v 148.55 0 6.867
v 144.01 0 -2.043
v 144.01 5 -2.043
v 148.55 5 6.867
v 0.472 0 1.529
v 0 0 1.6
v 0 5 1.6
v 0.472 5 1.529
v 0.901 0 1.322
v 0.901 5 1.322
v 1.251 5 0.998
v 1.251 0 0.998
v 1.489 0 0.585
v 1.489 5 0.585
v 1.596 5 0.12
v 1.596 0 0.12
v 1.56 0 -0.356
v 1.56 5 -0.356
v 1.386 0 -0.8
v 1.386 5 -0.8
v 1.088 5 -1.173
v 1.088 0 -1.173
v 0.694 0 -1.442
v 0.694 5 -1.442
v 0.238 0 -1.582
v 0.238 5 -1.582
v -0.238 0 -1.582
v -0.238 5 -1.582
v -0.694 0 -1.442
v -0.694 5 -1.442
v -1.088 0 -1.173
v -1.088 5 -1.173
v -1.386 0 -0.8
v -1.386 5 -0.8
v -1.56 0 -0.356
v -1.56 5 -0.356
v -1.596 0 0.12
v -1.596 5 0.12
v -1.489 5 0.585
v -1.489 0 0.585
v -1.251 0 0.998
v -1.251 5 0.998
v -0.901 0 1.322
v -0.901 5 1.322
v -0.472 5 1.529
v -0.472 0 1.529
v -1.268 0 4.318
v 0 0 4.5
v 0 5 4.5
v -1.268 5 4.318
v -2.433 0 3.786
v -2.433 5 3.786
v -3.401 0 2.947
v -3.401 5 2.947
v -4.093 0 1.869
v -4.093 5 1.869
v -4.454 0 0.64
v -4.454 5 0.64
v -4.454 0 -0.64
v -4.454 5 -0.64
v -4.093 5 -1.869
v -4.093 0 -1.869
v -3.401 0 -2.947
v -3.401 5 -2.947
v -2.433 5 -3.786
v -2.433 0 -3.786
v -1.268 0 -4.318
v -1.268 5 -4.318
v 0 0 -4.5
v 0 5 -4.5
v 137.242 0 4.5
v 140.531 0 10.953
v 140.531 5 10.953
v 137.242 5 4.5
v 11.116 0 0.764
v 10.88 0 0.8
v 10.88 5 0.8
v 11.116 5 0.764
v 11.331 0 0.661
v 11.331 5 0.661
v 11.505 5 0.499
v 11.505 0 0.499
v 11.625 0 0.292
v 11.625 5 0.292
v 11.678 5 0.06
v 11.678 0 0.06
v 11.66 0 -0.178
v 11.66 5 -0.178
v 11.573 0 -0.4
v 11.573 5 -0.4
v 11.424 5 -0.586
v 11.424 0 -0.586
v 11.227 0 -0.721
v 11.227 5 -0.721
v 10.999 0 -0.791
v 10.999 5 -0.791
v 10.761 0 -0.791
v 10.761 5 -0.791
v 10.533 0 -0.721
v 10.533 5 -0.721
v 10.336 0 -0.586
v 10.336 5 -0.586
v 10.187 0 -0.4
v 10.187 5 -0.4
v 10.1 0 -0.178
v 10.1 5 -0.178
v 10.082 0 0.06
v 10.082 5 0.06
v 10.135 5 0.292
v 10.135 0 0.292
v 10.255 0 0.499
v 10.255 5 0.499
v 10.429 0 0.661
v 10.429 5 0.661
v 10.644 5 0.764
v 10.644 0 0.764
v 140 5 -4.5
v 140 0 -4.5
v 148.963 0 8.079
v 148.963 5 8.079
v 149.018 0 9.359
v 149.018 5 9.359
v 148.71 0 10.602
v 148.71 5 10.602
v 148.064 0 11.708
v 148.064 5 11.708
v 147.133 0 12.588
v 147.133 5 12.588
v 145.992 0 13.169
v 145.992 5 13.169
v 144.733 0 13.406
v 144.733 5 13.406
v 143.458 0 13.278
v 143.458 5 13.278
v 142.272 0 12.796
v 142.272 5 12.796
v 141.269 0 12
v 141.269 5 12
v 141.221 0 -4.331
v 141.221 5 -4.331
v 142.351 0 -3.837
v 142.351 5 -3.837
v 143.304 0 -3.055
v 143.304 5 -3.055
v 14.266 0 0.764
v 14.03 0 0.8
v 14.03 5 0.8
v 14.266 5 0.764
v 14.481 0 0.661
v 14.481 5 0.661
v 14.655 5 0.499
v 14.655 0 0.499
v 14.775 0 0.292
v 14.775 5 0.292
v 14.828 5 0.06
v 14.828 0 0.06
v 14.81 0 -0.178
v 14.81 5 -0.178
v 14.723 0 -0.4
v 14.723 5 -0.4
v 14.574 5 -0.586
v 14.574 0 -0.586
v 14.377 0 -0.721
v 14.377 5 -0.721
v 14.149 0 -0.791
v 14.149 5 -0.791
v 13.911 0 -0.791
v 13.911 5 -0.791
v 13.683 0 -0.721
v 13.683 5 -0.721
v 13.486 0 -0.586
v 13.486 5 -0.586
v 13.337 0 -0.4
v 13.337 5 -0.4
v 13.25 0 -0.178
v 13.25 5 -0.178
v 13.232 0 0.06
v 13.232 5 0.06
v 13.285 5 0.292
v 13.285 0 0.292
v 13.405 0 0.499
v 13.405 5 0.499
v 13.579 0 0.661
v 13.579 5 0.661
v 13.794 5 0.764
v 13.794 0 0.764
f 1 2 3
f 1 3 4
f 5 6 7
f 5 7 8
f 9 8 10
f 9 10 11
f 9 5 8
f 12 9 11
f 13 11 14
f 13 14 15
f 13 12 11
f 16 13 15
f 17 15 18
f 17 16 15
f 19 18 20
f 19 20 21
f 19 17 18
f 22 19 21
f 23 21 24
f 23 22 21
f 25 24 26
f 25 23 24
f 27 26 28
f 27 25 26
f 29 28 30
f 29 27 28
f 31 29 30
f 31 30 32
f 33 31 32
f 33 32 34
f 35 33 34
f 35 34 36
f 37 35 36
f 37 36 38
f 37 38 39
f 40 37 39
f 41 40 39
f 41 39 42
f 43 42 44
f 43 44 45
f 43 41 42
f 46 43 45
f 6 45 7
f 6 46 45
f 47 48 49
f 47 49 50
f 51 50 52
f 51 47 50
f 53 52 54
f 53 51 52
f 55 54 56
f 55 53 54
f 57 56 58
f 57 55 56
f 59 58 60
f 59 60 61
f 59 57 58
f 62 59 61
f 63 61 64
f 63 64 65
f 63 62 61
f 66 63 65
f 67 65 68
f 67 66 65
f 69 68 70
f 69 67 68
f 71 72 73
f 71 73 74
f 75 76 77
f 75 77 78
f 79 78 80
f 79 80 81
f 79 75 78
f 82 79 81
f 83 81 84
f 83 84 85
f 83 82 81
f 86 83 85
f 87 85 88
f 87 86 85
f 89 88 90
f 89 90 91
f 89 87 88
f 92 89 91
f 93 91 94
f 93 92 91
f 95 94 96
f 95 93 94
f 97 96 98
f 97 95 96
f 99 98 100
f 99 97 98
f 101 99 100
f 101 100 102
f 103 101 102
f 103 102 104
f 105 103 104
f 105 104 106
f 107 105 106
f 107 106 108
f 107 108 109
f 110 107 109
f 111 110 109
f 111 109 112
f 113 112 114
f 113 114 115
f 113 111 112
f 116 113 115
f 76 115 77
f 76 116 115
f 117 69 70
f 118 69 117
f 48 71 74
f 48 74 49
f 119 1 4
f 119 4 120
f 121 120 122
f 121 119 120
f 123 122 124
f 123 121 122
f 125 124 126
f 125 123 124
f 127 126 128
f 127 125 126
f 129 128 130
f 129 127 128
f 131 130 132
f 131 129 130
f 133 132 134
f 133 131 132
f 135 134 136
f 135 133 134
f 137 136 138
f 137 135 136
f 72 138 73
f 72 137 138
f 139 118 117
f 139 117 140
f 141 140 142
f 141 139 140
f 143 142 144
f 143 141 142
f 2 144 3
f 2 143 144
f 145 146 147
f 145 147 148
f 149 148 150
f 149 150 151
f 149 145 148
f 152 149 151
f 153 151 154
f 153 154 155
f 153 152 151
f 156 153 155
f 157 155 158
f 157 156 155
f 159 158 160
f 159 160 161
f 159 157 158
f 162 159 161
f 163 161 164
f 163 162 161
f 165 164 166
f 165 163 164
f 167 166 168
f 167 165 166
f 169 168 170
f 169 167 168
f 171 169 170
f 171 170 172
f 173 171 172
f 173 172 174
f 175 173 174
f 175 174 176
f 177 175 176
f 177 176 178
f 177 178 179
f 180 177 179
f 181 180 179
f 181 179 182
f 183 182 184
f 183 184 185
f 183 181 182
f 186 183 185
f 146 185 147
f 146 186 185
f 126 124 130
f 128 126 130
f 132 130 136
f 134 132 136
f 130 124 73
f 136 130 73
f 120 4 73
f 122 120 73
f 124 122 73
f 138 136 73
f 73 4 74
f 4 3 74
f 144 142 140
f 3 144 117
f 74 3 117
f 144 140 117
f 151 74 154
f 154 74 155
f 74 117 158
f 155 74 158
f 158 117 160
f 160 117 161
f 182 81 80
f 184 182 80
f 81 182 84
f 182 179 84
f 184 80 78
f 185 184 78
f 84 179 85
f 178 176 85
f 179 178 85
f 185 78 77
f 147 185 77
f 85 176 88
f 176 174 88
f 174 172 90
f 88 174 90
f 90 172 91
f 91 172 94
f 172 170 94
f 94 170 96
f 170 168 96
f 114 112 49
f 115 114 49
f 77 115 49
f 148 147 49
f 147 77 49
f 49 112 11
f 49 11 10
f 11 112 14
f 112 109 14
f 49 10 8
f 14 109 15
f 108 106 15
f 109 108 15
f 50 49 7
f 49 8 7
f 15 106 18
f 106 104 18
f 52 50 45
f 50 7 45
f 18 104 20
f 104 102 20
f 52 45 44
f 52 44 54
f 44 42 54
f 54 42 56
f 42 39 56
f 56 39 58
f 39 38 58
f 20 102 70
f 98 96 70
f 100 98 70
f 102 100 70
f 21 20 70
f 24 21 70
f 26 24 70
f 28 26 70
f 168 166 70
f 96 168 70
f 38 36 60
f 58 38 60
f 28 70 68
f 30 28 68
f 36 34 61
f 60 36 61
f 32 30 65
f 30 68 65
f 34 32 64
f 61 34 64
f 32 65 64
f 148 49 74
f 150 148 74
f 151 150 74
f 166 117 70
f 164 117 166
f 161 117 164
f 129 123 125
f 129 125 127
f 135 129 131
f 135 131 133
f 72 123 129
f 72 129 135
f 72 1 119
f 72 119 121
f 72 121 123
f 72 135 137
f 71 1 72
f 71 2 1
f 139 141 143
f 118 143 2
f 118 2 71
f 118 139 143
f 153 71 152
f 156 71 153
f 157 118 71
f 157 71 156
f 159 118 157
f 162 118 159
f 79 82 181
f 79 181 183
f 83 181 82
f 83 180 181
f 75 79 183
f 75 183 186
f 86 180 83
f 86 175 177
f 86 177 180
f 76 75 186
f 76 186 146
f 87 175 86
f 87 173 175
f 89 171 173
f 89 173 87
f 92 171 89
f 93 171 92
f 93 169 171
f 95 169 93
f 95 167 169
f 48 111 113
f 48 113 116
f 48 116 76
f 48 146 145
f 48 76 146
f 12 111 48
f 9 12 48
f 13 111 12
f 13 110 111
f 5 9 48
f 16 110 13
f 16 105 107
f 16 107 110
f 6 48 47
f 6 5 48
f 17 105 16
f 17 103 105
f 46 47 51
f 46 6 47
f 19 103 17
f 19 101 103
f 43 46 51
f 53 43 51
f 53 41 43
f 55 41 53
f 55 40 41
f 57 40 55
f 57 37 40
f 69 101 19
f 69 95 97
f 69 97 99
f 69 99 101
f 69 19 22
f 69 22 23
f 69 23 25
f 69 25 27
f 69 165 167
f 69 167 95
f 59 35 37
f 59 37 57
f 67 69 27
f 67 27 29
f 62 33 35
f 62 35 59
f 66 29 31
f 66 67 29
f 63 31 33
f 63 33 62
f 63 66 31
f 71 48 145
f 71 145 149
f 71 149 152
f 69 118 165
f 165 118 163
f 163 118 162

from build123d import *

# Parameters (mm, degrees)
SKETCH1_R           = 1.6
SKETCH1_R_2         = 0.8
BOSS_EXTRUDE1_DEPTH = 5


with BuildPart() as part:
    # Sketch1 → Boss-Extrude1 (new body)
    # profile 1 of 2: a face of its own
    with BuildSketch(Plane(origin=(0, 0, 0), x_dir=(1, 0, 0), z_dir=(0, 1, 0))):
        with BuildLine():
            Line((0, 4.5), (140, 4.5))
            ThreePointArc((140, 4.5), (144.5, 0), (140, -4.5))
            Line((140, -4.5), (0, -4.5))
            ThreePointArc((0, -4.5), (-4.5, 0), (0, 4.5))
        make_face()
        with Locations(Location((0, 0, 0), (0, 0, 270))):
            Circle(SKETCH1_R, mode=Mode.SUBTRACT)
        with Locations(Location((10.88, 0, 0), (0, 0, 270))):
            Circle(SKETCH1_R_2, mode=Mode.SUBTRACT)
        with Locations(Location((14.03, 0, 0), (0, 0, 270))):
            Circle(SKETCH1_R_2, mode=Mode.SUBTRACT)
    # profile 2 of 2: a face of its own
    with BuildSketch(Plane(origin=(0, 0, 0), x_dir=(1, 0, 0), z_dir=(0, 1, 0))):
        with BuildLine():
            Line((144.009501751, 2.043011432), (148.549527155, -6.866992459))
            ThreePointArc((148.549527155, -6.866992459), (146.583036835, -12.919505642), (140.530523653, -10.953015322))
            Line((140.530523653, -10.953015322), (135.990498249, -2.043011432))
            ThreePointArc((135.990498249, -2.043011432), (137.956988568, 4.009501751), (144.009501751, 2.043011432))
        make_face()
    extrude(amount=BOSS_EXTRUDE1_DEPTH)


solid = part.part
